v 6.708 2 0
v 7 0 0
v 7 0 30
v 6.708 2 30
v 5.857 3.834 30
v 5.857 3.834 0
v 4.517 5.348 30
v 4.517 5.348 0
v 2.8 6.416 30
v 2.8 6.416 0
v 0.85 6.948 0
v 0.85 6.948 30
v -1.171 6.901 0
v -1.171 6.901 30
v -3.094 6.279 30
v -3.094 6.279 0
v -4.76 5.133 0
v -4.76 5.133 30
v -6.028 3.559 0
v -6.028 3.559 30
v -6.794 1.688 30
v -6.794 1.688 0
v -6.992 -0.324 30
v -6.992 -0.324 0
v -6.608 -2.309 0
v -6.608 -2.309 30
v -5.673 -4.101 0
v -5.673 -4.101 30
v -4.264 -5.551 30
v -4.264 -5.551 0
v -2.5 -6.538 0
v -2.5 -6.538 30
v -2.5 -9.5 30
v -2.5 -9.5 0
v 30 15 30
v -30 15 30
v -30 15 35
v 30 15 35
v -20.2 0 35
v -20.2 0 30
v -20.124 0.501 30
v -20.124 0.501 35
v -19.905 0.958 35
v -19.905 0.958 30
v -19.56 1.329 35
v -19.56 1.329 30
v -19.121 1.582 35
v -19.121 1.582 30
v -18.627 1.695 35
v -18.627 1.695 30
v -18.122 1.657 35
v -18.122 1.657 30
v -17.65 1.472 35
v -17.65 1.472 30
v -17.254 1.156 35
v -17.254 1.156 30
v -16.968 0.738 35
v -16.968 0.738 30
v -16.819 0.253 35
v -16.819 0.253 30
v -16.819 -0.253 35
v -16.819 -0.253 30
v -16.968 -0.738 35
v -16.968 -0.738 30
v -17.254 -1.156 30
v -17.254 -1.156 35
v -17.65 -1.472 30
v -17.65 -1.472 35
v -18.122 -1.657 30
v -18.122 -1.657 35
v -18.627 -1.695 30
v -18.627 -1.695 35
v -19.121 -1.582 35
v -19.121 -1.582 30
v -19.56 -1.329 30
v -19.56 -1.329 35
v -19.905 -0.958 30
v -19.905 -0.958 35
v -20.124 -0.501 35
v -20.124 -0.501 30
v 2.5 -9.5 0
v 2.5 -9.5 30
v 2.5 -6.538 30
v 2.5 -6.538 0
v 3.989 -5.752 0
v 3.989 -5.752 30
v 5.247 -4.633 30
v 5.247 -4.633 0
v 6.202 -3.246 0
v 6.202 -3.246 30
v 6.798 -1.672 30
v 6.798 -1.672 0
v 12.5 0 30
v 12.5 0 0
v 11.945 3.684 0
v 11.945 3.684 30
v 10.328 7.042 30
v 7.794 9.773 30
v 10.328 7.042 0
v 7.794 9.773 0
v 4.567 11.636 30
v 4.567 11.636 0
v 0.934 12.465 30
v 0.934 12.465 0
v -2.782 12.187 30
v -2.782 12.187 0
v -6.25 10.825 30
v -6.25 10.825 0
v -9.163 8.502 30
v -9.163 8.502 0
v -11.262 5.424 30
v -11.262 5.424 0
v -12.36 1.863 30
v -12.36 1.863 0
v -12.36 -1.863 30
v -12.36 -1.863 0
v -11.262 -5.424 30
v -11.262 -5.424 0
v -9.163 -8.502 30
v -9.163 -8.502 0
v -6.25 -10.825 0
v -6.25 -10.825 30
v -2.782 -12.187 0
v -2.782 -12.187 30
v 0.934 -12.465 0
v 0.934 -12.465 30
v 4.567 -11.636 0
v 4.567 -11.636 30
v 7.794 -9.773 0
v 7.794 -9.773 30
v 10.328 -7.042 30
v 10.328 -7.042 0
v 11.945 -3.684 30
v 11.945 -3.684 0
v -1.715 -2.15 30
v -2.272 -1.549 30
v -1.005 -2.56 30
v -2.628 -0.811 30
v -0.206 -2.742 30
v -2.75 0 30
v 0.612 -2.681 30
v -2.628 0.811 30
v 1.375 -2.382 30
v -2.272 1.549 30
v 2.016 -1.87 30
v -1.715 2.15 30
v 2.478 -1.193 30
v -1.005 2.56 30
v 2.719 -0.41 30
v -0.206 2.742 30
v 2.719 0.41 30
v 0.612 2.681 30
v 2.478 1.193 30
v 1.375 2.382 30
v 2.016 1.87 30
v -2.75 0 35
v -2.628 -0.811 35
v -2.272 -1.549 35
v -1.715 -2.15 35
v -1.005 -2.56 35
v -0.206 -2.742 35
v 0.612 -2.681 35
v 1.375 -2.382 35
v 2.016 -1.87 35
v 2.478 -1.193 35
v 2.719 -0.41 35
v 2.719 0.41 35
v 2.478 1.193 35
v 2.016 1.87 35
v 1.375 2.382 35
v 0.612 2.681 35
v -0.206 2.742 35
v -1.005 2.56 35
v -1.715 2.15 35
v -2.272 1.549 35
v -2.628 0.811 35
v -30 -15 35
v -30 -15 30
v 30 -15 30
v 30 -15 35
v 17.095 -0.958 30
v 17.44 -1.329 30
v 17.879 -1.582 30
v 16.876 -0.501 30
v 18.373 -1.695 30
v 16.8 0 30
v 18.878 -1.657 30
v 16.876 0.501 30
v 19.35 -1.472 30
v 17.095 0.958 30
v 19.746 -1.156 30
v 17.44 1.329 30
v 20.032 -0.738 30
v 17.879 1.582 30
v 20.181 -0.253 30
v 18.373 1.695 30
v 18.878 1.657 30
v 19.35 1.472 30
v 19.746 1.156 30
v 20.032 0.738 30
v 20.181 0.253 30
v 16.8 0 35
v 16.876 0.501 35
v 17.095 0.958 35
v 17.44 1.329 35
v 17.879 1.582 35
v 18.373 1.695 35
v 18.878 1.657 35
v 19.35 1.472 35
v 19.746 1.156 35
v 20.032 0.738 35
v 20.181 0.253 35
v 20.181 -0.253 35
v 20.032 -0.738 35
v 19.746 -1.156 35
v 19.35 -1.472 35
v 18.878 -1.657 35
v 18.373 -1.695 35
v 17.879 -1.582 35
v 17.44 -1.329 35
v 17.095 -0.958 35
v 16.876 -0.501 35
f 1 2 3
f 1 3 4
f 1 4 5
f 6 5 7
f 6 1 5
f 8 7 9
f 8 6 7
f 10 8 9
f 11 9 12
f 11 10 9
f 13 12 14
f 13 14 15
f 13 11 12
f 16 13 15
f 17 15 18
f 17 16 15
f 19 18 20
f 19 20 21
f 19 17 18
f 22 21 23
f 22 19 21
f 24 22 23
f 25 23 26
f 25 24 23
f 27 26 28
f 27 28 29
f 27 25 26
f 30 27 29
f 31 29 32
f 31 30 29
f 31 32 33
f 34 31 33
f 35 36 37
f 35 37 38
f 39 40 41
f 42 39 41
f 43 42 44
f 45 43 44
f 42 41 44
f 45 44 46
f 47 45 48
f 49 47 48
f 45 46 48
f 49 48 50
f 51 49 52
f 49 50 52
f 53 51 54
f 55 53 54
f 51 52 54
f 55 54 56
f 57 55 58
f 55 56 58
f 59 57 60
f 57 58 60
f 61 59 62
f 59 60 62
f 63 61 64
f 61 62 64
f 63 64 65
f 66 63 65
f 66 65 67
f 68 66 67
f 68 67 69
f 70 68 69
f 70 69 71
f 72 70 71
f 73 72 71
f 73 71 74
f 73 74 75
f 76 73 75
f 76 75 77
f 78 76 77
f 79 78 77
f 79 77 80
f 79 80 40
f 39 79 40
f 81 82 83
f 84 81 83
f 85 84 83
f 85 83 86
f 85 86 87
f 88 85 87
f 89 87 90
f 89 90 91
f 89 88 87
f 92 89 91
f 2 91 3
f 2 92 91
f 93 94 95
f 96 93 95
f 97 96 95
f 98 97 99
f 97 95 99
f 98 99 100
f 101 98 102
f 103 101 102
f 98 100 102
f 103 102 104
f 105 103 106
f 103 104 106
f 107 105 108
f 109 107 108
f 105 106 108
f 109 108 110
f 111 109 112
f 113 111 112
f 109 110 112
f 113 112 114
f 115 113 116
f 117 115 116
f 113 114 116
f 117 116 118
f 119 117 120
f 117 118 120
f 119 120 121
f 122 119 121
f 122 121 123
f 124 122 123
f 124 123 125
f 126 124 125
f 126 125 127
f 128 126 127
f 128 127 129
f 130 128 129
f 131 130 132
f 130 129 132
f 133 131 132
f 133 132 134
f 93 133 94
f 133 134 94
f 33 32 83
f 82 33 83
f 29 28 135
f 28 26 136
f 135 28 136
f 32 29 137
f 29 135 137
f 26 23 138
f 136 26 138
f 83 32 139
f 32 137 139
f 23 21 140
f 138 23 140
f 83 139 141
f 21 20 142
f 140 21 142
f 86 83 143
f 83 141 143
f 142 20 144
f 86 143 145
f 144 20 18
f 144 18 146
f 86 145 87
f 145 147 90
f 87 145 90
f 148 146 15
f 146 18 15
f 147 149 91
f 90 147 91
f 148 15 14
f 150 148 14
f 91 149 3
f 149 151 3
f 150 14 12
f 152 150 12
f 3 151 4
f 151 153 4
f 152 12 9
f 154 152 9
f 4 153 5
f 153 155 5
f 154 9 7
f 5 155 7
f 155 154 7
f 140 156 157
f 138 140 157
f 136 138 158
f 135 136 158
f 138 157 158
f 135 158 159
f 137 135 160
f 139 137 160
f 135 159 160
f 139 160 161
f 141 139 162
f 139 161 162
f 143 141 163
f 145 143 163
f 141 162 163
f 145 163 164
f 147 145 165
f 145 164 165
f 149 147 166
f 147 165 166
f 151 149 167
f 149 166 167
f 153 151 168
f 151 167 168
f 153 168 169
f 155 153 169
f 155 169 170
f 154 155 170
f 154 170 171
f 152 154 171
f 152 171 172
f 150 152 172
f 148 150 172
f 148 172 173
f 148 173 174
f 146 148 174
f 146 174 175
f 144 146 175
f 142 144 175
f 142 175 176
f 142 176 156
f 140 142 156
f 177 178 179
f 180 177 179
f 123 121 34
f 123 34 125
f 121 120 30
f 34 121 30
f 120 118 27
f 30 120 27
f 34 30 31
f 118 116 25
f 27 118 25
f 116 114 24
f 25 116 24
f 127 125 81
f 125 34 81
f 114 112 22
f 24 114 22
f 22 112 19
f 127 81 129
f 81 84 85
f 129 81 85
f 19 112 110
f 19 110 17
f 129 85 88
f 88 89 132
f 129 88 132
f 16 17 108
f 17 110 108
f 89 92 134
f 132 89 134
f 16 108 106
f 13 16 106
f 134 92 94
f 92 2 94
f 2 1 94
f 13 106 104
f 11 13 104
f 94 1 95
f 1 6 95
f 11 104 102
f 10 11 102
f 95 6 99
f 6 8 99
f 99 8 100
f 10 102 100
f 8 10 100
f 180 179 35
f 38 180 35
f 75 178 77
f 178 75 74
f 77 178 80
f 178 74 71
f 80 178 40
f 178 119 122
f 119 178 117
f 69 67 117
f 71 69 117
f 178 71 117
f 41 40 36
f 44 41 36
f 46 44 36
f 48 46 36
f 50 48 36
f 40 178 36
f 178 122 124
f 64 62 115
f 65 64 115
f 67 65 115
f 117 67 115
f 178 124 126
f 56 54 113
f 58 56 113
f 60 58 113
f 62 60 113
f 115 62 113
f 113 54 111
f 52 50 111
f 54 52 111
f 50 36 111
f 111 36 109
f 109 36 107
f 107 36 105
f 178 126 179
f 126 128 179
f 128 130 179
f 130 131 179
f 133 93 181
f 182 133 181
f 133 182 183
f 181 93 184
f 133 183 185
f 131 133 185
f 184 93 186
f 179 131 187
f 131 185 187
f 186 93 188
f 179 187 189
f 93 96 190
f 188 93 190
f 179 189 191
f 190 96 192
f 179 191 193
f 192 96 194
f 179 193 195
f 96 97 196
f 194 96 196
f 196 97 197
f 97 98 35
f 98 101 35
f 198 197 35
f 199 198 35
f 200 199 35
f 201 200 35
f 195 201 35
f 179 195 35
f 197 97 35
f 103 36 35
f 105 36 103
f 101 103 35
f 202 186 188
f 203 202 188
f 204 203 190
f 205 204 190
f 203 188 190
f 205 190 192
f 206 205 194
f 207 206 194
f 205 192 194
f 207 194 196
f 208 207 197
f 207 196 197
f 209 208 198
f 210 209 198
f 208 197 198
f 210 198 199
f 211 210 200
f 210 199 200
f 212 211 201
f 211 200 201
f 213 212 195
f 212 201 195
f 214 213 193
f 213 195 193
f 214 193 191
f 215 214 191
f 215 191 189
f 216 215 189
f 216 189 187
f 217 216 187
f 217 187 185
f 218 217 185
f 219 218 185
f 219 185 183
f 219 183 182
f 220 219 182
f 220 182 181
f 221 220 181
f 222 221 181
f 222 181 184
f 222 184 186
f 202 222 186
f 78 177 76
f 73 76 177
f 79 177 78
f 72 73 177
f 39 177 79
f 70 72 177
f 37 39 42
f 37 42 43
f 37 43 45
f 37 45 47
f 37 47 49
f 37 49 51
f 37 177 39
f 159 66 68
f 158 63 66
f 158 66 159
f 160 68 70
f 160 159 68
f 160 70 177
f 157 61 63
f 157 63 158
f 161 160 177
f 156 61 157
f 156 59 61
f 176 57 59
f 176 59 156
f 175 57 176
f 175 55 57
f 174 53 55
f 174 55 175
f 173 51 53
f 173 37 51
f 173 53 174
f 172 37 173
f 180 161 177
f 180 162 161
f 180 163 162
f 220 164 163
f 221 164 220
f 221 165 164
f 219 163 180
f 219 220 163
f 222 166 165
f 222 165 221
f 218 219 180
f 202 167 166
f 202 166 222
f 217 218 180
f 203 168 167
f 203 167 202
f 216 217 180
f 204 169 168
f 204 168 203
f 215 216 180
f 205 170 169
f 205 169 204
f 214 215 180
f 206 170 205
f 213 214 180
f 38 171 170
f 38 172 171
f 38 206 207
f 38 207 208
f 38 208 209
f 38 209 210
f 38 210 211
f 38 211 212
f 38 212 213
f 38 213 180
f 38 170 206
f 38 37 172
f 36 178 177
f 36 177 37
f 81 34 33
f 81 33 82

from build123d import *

# Parameters (mm, degrees)
F0_W     = 60
F0_H     = 30
F1_DEPTH = 35
F2_DEPTH = 30
F4_W     = 60
F4_H     = 30
F4_R     = 12.5
F5_DEPTH = 30
F7_D     = 3.4
F8_D     = 5.5


with BuildPart() as f1:
    # F0 (on Top) → F1 (new body)
    with BuildSketch(Plane.XY):
        Rectangle(F0_W, F0_H)
        with BuildLine():
            ThreePointArc((-2.5, -6.5383484153), (-3.9686269666, 5.7662812973), (7, 0))
            ThreePointArc((7, 0), (5.7662812973, -3.9686269666), (2.5, -6.5383484153))
            Line((2.5, -6.5383484153), (2.5, -9.5))
            Line((2.5, -9.5), (0, -9.5))
            Line((0, -9.5), (-2.5, -9.5))
            Line((-2.5, -9.5), (-2.5, -6.5383484153))
        make_face(mode=Mode.SUBTRACT)
        with BuildLine():
            ThreePointArc((2.5, -6.5383484153), (5.7662812973, -3.9686269666), (7, 0))
            ThreePointArc((7, 0), (-3.9686269666, 5.7662812973), (-2.5, -6.5383484153))
            ThreePointArc((-2.5, -6.5383484153), (0, -7), (2.5, -6.5383484153))
        make_face()
        with BuildLine():
            ThreePointArc((2.5, -6.5383484153), (0, -7), (-2.5, -6.5383484153))
            Line((-2.5, -6.5383484153), (-2.5, -9.5))
            Line((-2.5, -9.5), (0, -9.5))
            Line((0, -9.5), (2.5, -9.5))
            Line((2.5, -9.5), (2.5, -6.5383484153))
        make_face()
    extrude(amount=F1_DEPTH)

    # F0 (on Top) → F2 (cut)
    with BuildSketch(Plane.XY):
        with BuildLine():
            ThreePointArc((2.5, -6.5383484153), (5.7662812973, -3.9686269666), (7, 0))
            ThreePointArc((7, 0), (-3.9686269666, 5.7662812973), (-2.5, -6.5383484153))
            ThreePointArc((-2.5, -6.5383484153), (0, -7), (2.5, -6.5383484153))
        make_face()
        with BuildLine():
            ThreePointArc((2.5, -6.5383484153), (0, -7), (-2.5, -6.5383484153))
            Line((-2.5, -6.5383484153), (-2.5, -9.5))
            Line((-2.5, -9.5), (0, -9.5))
            Line((0, -9.5), (2.5, -9.5))
            Line((2.5, -9.5), (2.5, -6.5383484153))
        make_face()
    extrude(amount=F2_DEPTH, mode=Mode.SUBTRACT)

    # F4 (on face) → F5 (cut)
    with BuildSketch(Plane.XY):
        Rectangle(F4_W, F4_H)
        Circle(F4_R, mode=Mode.SUBTRACT)
    extrude(amount=F5_DEPTH, mode=Mode.SUBTRACT)

    # F7 (through all)
    with Locations(Plane.XY.offset(35)):
        with Locations((-18.5, 0), (18.5, 0)):
            Hole(F7_D / 2)

    # F8 (through all)
    with Locations(Plane(origin=(0, 0, 0), x_dir=(1, 0, 0), z_dir=(0, 0, -1))):
        with Locations((0, 0)):
            Hole(F8_D / 2)


solid = f1.part
